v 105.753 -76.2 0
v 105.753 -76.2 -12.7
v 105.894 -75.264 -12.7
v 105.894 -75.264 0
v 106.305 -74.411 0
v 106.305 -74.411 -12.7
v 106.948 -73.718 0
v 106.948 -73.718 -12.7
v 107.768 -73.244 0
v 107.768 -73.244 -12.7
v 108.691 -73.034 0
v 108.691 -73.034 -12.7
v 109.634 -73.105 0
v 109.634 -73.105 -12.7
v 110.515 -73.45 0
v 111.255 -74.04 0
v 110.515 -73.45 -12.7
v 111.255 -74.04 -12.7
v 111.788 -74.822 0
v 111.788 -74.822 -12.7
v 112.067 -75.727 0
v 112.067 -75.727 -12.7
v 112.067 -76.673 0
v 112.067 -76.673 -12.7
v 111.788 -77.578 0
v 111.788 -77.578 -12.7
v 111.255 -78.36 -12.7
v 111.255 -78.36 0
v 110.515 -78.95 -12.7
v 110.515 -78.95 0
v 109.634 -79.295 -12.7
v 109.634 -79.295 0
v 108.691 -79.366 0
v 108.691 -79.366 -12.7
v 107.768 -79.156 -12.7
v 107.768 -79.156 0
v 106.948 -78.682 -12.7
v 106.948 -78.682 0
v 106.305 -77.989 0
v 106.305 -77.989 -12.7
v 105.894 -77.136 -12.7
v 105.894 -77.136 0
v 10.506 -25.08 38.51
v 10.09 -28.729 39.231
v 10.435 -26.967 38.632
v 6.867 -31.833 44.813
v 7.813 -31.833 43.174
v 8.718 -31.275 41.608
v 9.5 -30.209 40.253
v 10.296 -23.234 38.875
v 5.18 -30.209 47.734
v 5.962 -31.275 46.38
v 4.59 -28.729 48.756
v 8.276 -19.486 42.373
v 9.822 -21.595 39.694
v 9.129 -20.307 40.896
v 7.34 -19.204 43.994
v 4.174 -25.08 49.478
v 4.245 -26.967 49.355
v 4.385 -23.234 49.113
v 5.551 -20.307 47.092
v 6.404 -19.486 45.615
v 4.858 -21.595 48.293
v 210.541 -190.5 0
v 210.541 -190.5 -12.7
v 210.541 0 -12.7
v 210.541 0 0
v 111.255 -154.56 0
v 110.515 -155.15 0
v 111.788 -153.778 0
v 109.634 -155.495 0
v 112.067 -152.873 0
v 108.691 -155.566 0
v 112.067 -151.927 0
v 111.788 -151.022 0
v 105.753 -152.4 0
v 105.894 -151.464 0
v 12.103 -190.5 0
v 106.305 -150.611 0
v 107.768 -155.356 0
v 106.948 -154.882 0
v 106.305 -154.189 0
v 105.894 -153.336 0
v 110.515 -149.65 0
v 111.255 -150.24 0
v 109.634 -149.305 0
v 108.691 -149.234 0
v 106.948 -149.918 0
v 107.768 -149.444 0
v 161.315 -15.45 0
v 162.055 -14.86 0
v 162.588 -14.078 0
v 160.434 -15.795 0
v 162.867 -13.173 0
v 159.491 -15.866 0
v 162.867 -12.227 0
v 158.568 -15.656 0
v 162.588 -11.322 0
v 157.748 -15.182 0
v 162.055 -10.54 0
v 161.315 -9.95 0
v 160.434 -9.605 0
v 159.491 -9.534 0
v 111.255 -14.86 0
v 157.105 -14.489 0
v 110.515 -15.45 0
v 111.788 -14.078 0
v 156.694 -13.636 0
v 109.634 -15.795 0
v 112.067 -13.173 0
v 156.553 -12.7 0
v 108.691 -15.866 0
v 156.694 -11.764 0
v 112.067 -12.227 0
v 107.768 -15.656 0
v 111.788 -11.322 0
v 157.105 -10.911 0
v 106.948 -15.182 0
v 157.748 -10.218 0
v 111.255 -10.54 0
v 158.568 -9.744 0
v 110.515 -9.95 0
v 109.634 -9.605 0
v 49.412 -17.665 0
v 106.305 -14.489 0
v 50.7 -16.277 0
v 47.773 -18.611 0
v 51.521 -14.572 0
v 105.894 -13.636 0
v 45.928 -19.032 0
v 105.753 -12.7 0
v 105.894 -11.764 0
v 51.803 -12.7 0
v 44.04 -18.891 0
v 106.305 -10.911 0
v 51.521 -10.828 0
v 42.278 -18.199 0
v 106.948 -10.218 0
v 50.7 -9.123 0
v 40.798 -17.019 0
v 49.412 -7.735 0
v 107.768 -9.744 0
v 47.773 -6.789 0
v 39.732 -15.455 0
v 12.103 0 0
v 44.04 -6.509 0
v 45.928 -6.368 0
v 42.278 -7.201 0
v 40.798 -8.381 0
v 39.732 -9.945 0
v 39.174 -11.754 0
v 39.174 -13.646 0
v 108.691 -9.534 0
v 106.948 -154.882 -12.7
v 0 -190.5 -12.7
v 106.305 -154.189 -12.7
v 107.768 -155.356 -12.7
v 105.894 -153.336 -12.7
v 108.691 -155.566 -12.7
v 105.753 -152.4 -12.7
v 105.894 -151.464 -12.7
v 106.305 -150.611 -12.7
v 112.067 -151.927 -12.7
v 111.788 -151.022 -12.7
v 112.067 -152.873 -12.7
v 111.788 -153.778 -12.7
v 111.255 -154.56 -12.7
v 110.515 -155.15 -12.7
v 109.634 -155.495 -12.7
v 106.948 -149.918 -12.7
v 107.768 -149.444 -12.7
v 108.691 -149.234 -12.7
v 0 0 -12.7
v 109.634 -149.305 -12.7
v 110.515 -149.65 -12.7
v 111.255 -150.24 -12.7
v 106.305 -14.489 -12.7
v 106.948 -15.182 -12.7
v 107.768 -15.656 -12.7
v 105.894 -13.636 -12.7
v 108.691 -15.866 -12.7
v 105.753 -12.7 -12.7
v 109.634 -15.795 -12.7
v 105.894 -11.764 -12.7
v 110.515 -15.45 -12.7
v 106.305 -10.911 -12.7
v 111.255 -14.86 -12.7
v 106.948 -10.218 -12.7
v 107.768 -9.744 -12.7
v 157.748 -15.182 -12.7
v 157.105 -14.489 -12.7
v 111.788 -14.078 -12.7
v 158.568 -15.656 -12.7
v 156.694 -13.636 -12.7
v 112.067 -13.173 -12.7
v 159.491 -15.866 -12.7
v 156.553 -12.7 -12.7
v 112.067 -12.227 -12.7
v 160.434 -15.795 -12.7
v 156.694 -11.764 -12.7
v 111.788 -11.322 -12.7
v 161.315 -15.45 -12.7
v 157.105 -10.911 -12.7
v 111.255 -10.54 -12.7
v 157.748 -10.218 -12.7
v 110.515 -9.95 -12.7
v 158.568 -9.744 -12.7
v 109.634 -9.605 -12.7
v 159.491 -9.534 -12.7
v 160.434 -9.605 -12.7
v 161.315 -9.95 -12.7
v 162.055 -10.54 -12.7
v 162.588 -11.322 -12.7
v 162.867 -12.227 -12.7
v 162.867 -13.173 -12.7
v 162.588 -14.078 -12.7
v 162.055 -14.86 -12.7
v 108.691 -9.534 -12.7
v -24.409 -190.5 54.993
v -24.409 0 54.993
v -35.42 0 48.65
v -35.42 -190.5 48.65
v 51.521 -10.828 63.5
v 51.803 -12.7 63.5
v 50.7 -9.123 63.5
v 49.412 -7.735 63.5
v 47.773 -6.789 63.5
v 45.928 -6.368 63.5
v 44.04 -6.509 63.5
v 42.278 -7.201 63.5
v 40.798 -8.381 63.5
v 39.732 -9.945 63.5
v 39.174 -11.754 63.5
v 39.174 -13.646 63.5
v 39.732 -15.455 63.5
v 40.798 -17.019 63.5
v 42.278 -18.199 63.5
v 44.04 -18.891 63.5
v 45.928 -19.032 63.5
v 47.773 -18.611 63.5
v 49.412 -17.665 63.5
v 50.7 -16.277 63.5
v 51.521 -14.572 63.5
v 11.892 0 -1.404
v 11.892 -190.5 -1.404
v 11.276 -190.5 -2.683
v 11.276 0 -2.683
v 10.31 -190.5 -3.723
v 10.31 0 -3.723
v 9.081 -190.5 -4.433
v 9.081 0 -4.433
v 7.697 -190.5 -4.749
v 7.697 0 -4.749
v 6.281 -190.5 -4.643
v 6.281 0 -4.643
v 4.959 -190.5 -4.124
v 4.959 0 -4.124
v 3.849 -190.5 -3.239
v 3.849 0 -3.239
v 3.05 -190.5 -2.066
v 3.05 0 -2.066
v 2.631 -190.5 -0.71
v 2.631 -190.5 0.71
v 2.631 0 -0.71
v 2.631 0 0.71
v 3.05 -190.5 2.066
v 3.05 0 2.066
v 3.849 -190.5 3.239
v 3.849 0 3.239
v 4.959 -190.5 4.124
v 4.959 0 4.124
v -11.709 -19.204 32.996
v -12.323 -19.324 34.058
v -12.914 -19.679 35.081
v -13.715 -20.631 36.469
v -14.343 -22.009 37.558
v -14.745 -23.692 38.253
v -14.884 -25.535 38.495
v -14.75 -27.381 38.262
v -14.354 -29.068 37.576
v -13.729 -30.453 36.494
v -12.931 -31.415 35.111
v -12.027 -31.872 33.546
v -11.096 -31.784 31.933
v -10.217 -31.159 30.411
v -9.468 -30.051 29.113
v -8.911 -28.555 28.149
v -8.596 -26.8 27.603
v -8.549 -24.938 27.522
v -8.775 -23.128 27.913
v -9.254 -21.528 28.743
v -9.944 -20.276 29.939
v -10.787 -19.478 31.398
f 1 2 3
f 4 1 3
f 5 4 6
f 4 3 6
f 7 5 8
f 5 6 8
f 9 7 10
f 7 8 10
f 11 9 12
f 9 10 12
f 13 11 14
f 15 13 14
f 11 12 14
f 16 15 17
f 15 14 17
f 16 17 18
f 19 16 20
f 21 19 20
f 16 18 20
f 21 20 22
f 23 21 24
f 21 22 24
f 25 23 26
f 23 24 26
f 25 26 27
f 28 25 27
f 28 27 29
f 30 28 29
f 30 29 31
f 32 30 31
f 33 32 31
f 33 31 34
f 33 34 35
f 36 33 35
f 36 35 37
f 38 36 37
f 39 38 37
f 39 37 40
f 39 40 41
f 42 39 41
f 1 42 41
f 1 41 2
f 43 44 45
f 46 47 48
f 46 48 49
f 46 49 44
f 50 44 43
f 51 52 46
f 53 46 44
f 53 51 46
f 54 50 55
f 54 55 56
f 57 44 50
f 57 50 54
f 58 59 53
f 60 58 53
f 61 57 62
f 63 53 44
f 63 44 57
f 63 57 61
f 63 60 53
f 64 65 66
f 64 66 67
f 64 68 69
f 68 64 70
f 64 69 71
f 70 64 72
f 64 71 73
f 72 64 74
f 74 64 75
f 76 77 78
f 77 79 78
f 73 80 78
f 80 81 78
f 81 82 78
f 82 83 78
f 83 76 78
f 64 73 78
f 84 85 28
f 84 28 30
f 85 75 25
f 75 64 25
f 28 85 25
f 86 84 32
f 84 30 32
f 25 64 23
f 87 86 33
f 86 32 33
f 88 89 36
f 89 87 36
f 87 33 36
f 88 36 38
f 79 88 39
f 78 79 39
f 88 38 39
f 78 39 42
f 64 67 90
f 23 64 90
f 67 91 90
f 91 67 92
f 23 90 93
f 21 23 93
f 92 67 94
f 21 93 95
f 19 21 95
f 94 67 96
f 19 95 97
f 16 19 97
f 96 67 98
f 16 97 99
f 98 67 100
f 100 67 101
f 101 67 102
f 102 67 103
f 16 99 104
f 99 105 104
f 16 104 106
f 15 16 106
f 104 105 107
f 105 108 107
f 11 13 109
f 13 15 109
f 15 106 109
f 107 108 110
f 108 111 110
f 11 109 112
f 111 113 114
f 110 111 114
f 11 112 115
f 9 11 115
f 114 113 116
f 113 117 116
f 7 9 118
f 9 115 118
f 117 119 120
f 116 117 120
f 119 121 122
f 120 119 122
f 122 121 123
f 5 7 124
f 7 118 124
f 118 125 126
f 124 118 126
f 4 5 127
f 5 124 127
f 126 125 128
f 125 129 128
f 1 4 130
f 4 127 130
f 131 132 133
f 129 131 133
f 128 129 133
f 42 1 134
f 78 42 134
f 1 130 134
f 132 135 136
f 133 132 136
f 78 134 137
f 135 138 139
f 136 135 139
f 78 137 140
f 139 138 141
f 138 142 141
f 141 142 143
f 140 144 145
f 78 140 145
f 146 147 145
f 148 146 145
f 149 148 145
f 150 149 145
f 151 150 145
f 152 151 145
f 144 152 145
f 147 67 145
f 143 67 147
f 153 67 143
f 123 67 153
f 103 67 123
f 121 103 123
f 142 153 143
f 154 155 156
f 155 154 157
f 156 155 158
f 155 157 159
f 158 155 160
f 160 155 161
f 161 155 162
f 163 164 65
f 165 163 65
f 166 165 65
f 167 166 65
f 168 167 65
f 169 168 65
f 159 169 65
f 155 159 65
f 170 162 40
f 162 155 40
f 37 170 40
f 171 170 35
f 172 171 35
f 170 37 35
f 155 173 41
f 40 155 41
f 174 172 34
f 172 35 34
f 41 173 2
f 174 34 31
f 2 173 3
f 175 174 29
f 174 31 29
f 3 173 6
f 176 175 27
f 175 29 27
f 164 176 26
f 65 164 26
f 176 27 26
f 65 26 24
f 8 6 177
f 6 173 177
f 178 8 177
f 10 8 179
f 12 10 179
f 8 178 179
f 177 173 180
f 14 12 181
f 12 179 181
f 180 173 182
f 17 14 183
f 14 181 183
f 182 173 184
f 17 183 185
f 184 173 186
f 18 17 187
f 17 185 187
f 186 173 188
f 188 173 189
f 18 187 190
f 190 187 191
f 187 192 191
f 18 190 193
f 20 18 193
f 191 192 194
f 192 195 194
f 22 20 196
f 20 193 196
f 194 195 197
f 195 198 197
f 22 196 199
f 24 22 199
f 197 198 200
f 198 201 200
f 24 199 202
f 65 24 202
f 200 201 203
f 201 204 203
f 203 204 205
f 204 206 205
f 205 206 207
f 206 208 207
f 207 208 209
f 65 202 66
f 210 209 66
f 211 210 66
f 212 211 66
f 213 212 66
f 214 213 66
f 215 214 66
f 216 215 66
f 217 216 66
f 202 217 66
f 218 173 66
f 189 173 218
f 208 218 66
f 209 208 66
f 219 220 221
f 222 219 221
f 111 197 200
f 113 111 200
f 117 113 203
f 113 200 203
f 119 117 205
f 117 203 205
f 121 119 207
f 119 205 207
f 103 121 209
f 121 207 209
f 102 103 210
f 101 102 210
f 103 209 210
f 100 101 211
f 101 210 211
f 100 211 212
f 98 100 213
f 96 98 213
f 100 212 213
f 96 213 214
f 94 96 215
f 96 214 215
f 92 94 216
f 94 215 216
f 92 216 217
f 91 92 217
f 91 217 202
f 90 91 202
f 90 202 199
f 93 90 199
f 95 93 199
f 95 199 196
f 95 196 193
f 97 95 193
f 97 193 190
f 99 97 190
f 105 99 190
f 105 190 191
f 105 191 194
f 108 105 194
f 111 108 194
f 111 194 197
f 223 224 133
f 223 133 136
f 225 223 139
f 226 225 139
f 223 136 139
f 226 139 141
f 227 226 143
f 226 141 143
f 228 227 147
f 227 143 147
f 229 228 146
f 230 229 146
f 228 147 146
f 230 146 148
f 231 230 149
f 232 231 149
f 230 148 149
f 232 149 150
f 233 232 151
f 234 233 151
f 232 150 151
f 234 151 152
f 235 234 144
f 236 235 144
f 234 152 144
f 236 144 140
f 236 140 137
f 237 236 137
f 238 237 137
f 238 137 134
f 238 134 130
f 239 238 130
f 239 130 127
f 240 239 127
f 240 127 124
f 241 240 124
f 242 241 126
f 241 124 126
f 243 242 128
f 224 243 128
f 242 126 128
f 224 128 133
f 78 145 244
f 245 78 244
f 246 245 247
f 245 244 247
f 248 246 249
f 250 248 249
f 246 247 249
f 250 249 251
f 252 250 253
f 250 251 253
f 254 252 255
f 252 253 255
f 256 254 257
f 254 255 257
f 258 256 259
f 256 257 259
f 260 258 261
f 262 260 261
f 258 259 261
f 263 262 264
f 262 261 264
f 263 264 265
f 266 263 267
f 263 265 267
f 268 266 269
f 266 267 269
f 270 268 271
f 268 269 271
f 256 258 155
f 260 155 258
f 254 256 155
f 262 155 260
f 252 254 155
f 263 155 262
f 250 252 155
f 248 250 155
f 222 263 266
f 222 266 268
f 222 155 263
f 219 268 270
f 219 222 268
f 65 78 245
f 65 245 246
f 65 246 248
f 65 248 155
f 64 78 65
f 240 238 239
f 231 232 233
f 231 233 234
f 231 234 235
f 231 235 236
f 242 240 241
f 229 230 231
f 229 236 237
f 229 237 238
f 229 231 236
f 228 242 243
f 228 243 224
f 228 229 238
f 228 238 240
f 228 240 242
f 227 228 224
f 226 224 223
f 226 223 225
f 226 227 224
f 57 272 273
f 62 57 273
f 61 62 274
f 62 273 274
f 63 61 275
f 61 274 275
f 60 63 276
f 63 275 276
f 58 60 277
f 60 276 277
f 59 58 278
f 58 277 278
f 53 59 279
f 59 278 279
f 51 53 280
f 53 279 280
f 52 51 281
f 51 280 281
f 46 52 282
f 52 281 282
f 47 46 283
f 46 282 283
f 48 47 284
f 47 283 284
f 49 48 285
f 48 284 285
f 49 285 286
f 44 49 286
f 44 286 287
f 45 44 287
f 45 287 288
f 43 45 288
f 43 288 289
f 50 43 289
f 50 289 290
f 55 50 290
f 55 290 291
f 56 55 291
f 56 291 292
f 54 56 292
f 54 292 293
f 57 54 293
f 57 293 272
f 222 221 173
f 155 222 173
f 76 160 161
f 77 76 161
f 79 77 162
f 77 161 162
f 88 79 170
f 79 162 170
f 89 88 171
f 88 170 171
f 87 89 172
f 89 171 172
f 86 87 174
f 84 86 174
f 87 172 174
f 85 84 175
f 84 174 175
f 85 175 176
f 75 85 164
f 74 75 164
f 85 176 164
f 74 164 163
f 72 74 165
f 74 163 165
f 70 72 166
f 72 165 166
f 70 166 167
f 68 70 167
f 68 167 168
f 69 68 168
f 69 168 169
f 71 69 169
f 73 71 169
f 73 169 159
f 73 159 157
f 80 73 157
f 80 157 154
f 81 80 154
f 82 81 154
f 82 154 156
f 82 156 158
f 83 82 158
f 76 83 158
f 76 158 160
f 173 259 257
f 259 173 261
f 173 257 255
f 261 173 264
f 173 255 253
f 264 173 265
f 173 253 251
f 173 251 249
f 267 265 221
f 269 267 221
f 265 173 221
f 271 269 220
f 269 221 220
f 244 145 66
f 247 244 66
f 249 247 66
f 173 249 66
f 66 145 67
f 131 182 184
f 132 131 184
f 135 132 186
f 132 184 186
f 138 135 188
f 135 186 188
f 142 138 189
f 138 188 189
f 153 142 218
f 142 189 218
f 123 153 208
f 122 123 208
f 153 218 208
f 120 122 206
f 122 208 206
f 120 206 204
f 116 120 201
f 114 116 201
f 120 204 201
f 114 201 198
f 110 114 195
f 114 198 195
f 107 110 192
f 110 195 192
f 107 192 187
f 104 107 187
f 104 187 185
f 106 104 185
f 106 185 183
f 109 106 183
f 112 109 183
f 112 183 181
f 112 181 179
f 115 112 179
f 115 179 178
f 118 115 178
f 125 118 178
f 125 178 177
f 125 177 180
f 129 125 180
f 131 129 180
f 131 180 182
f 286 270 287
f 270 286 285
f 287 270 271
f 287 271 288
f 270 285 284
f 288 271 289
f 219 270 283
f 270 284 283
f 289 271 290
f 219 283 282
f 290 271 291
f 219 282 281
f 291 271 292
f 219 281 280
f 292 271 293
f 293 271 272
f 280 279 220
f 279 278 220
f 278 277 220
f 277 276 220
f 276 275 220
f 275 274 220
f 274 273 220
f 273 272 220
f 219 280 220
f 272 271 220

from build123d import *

# Parameters (mm, degrees)
F1_DEPTH = 190.5
F2_R     = 6.35
F3_DEPTH = 21.9964
F6_D     = 6.35
F7_R     = 6.35
F8_DEPTH = 63.5


with BuildPart() as f1:
    # F0 (on Front) → F1 (new body)
    with BuildSketch(Plane.XZ):
        with BuildLine():
            Line((210.5406, 0), (12.1031, 0))
            ThreePointArc((12.1031, 0), (4.95935, -4.124446), (4.95935, 4.124446))
            Line((4.95935, 4.124446), (-24.4094, 54.992613))
            Line((-24.4094, 54.992613), (-35.4203, 48.649759))
            Line((-35.4203, 48.649759), (0, -12.7))
            Line((0, -12.7), (210.5406, -12.7))
            Line((210.5406, -12.7), (210.5406, 0))
        make_face()
    extrude(amount=F1_DEPTH)

    # F2 (on face) → F3 (join)
    with BuildSketch(Plane(origin=(5.50545, 0, 3.178573), x_dir=(0, 1, 0), z_dir=(0.866025, 0, 0.5))):
        with Locations((-25.554094, 34.4297)):
            Circle(F2_R)
    extrude(amount=F3_DEPTH)

    # F6 (through all)
    with Locations(Plane.XY):
        with Locations((108.9279, -12.7), (159.7279, -12.7), (108.9279, -76.2), (108.9279, -152.4)):
            Hole(F6_D / 2)

    # F7 (on face) → F8 (join)
    with BuildSketch(Plane.XY):
        with Locations((45.4533, -12.7)):
            Circle(F7_R)
    extrude(amount=F8_DEPTH)


solid = f1.part
